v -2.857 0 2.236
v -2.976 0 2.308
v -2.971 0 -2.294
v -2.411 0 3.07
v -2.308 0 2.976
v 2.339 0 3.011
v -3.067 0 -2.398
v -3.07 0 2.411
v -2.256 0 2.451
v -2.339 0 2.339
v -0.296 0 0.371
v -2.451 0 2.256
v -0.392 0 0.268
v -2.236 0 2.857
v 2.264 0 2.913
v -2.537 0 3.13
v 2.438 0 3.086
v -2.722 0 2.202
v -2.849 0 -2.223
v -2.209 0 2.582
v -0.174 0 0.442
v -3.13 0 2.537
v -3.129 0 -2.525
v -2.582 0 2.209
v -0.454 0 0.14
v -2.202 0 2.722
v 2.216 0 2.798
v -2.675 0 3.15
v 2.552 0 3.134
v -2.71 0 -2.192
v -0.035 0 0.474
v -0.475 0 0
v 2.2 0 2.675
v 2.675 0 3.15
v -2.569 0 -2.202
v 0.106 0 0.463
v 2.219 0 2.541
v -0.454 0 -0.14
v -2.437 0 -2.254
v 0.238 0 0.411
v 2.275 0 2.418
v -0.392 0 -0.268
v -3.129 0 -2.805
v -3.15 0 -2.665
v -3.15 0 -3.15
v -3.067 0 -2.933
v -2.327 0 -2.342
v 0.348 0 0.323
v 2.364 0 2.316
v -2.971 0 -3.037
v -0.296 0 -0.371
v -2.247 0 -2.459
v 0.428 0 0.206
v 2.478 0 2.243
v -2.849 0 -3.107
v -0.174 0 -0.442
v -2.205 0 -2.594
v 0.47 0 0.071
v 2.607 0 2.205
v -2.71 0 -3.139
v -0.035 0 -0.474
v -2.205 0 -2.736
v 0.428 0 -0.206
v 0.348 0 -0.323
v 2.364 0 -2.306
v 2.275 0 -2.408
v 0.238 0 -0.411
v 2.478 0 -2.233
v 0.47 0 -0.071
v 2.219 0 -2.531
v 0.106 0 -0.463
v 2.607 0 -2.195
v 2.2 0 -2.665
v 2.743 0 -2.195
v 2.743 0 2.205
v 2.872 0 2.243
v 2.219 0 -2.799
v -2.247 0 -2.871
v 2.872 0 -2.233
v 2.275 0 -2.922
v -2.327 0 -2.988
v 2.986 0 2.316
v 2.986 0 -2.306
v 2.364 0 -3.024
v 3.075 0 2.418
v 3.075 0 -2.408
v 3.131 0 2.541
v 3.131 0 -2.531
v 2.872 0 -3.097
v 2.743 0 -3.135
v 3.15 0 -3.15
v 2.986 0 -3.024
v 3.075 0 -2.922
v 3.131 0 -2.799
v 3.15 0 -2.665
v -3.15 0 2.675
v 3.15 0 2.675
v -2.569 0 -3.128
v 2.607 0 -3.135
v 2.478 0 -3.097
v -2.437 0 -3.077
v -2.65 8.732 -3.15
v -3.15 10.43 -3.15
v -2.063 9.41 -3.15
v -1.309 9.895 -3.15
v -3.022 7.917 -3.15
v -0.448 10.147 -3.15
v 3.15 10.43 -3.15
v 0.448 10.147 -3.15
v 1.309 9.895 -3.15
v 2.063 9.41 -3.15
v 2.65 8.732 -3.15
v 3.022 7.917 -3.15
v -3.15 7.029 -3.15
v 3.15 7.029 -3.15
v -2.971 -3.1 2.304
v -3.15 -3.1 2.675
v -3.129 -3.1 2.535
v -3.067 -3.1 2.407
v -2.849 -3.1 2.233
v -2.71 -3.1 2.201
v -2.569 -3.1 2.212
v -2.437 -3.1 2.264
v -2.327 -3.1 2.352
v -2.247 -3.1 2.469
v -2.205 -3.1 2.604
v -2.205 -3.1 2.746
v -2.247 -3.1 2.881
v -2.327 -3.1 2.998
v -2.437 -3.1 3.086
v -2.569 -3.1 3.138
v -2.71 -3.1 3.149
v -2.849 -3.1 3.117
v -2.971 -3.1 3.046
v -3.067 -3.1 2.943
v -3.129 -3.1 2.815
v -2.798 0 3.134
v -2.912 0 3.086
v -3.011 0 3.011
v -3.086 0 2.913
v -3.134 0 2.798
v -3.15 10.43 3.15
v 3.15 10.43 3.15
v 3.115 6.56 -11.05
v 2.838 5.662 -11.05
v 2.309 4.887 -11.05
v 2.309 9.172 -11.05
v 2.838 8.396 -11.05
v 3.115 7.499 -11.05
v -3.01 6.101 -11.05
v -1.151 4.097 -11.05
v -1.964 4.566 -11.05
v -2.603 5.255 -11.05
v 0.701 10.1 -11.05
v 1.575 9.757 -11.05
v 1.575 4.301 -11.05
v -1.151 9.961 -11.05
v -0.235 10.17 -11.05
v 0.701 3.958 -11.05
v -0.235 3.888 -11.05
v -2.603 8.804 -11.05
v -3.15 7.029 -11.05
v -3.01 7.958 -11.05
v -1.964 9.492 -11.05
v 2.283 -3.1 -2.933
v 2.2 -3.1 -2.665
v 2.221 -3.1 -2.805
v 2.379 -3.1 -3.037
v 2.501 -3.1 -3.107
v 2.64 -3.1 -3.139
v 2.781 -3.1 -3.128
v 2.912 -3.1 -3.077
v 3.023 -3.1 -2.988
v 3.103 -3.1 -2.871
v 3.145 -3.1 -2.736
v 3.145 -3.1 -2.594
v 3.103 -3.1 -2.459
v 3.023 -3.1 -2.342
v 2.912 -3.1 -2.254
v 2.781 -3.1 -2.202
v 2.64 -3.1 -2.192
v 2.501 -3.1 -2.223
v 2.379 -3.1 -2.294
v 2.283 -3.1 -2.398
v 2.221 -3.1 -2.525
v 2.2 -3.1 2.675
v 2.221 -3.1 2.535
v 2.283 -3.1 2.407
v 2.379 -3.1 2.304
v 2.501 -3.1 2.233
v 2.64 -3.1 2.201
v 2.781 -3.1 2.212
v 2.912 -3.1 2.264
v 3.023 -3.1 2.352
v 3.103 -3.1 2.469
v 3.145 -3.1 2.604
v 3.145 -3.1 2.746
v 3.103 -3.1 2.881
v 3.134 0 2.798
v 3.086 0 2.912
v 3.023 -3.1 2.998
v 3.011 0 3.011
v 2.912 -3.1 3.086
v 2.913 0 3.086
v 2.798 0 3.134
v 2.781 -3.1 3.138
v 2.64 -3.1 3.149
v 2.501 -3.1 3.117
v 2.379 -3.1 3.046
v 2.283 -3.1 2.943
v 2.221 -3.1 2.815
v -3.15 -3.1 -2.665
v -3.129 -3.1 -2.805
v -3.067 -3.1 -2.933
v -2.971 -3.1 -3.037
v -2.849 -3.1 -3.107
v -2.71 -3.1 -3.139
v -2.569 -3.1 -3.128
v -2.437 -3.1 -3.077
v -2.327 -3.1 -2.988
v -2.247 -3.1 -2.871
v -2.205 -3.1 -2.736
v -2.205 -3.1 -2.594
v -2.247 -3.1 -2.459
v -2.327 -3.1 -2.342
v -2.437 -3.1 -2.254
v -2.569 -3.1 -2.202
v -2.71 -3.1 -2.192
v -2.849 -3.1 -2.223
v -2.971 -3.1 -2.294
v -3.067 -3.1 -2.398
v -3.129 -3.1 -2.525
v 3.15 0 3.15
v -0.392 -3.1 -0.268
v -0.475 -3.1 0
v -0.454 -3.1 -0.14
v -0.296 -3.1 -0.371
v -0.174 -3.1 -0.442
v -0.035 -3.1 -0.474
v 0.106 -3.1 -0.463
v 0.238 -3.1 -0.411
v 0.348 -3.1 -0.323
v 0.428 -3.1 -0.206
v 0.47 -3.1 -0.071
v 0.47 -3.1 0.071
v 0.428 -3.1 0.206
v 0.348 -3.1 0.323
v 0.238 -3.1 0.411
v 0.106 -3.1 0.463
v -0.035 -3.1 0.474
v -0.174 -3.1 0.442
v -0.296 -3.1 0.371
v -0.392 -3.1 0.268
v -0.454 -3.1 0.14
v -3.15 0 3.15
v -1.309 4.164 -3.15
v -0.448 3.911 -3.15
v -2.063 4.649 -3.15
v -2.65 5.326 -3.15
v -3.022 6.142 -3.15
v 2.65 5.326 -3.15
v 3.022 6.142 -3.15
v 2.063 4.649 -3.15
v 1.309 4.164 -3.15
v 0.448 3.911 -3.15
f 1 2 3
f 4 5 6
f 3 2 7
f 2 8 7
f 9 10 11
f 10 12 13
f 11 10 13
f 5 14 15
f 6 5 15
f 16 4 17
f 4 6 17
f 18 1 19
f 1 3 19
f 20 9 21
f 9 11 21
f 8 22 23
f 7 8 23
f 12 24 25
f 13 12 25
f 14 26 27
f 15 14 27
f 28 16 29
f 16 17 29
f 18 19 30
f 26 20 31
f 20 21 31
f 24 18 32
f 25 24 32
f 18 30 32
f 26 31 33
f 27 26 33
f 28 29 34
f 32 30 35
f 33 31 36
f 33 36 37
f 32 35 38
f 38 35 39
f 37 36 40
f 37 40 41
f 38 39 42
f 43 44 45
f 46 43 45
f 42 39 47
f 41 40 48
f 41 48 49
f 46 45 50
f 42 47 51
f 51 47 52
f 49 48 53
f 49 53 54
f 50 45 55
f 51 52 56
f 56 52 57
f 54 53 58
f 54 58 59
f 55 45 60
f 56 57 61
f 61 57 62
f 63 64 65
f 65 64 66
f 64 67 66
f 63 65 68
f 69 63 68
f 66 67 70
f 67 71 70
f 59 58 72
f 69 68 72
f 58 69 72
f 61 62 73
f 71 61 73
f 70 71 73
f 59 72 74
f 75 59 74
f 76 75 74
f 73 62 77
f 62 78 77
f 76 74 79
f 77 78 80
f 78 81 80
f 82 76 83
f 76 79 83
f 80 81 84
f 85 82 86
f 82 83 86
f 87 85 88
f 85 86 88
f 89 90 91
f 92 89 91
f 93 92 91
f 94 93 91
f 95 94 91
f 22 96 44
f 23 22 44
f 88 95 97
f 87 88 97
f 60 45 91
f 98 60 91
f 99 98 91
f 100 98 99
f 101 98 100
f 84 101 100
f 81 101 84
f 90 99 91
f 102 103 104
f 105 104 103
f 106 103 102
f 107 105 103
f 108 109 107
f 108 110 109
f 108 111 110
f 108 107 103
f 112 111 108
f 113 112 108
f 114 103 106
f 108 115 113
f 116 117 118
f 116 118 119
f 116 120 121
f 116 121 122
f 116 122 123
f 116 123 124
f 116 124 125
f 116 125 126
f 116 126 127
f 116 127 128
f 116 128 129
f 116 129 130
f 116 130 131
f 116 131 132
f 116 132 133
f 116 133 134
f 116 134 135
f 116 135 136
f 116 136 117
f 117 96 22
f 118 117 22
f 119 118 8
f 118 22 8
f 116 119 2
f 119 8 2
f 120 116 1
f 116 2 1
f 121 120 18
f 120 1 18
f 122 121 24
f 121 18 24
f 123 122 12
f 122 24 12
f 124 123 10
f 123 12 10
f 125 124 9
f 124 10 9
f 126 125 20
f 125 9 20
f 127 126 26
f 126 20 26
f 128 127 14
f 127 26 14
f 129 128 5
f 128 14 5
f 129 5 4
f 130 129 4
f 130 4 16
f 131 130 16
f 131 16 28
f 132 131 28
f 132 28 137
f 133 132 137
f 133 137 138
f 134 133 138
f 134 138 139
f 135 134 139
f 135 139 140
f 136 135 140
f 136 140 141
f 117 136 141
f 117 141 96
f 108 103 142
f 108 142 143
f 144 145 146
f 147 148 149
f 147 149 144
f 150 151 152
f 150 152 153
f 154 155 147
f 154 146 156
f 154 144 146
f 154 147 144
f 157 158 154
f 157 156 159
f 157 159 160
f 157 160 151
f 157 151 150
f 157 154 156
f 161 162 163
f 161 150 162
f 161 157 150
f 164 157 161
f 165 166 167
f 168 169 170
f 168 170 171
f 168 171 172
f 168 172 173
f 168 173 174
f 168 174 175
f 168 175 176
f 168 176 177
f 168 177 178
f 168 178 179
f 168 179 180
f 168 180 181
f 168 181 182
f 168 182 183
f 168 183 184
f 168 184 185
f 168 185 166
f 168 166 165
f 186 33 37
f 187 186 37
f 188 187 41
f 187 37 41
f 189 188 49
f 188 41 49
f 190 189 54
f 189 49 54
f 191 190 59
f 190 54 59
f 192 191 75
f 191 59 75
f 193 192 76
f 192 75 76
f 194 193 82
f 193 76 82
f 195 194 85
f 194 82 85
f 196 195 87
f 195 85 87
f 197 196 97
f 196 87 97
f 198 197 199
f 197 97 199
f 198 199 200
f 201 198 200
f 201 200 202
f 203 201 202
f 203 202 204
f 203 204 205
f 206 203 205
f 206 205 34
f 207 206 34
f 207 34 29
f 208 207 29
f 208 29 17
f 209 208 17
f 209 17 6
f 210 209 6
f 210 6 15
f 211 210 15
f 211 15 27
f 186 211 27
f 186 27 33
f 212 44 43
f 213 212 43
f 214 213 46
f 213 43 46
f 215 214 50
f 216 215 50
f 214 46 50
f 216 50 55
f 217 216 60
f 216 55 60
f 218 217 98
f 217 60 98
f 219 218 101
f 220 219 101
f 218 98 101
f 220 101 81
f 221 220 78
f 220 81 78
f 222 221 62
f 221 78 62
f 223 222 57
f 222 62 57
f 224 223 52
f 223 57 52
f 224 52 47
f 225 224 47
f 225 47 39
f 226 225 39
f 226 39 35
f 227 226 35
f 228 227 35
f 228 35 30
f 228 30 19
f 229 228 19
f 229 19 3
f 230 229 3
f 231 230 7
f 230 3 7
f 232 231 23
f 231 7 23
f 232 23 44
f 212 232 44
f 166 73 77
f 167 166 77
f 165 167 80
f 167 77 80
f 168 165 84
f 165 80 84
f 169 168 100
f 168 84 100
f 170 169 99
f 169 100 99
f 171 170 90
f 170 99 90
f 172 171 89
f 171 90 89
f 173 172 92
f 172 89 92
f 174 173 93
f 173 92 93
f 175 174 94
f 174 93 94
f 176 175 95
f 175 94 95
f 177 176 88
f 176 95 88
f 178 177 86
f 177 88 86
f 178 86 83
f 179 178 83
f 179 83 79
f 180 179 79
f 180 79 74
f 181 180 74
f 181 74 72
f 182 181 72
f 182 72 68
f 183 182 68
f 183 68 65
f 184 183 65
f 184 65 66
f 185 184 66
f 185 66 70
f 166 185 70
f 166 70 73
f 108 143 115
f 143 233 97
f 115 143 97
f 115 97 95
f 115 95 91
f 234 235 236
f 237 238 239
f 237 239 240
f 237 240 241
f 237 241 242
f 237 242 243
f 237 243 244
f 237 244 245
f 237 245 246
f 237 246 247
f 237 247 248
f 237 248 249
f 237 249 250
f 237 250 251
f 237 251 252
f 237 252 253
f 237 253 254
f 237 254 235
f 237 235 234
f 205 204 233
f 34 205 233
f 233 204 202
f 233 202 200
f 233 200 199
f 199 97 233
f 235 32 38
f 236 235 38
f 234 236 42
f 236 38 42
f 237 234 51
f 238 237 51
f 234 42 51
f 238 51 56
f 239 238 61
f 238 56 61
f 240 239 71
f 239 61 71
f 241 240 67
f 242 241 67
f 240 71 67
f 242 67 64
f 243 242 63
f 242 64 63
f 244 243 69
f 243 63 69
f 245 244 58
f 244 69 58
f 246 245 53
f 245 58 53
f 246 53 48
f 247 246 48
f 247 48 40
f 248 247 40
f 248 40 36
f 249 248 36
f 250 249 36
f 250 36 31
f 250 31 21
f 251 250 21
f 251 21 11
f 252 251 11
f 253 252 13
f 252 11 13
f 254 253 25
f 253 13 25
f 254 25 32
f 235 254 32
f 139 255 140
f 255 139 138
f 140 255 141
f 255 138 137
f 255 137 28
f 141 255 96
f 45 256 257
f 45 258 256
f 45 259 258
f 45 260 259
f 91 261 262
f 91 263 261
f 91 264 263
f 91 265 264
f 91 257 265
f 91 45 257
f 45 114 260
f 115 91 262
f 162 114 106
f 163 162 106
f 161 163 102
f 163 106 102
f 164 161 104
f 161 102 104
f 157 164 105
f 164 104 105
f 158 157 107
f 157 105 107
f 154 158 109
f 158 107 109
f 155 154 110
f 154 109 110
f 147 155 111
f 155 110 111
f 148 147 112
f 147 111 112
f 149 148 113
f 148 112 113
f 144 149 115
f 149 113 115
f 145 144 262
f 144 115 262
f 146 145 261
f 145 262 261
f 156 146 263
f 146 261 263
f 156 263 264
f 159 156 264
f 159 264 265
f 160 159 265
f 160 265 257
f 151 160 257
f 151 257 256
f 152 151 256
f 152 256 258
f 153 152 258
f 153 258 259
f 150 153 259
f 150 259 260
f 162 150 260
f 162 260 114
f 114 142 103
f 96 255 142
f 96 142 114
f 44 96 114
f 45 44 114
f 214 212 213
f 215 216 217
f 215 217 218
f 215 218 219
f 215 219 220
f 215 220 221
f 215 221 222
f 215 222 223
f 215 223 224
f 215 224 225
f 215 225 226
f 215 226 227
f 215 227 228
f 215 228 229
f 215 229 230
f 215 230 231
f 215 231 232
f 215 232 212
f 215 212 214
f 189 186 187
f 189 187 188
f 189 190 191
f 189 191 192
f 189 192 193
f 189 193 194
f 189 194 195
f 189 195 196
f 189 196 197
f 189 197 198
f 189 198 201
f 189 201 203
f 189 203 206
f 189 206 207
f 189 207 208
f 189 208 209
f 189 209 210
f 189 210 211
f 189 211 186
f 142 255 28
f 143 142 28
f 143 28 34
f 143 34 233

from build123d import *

# Parameters (mm, degrees)
SKETCH1_W           = 6.3
SKETCH1_H           = 6.3
BOSS_EXTRUDE1_DEPTH = 10.43
SKETCH2_R           = 3.15
BOSS_EXTRUDE2_DEPTH = 7.9
SKETCH3_R           = 0.475
BOSS_EXTRUDE3_DEPTH = 3.1


with BuildPart() as part:
    # Sketch1 → Boss-Extrude1 (new body)
    with BuildSketch(Plane(origin=(0, 0, 0), x_dir=(1, 0, 0), z_dir=(0, 1, 0))):
        Rectangle(SKETCH1_W, SKETCH1_H)
    extrude(amount=BOSS_EXTRUDE1_DEPTH)

    # Sketch2 → Boss-Extrude2 (add)
    with BuildSketch(Plane(origin=(0, 0, -3.15), x_dir=(-1, 0, 0), z_dir=(0, 0, -1))):
        with Locations((0, 7.029219023)):
            Circle(SKETCH2_R)
    extrude(amount=BOSS_EXTRUDE2_DEPTH)

    # Sketch3 → Boss-Extrude3 (add)
    with BuildSketch(Plane(origin=(0, 0, 0), x_dir=(-1, 0, 0), z_dir=(0, -1, 0))):
        Circle(SKETCH3_R)
        with Locations((2.675, -2.675)):
            Circle(SKETCH3_R)
        with Locations((-2.675, -2.675)):
            Circle(SKETCH3_R)
        with Locations((2.675, 2.66524354)):
            Circle(SKETCH3_R)
        with Locations((-2.675, 2.66524354)):
            Circle(SKETCH3_R)
    extrude(amount=BOSS_EXTRUDE3_DEPTH)


solid = part.part
